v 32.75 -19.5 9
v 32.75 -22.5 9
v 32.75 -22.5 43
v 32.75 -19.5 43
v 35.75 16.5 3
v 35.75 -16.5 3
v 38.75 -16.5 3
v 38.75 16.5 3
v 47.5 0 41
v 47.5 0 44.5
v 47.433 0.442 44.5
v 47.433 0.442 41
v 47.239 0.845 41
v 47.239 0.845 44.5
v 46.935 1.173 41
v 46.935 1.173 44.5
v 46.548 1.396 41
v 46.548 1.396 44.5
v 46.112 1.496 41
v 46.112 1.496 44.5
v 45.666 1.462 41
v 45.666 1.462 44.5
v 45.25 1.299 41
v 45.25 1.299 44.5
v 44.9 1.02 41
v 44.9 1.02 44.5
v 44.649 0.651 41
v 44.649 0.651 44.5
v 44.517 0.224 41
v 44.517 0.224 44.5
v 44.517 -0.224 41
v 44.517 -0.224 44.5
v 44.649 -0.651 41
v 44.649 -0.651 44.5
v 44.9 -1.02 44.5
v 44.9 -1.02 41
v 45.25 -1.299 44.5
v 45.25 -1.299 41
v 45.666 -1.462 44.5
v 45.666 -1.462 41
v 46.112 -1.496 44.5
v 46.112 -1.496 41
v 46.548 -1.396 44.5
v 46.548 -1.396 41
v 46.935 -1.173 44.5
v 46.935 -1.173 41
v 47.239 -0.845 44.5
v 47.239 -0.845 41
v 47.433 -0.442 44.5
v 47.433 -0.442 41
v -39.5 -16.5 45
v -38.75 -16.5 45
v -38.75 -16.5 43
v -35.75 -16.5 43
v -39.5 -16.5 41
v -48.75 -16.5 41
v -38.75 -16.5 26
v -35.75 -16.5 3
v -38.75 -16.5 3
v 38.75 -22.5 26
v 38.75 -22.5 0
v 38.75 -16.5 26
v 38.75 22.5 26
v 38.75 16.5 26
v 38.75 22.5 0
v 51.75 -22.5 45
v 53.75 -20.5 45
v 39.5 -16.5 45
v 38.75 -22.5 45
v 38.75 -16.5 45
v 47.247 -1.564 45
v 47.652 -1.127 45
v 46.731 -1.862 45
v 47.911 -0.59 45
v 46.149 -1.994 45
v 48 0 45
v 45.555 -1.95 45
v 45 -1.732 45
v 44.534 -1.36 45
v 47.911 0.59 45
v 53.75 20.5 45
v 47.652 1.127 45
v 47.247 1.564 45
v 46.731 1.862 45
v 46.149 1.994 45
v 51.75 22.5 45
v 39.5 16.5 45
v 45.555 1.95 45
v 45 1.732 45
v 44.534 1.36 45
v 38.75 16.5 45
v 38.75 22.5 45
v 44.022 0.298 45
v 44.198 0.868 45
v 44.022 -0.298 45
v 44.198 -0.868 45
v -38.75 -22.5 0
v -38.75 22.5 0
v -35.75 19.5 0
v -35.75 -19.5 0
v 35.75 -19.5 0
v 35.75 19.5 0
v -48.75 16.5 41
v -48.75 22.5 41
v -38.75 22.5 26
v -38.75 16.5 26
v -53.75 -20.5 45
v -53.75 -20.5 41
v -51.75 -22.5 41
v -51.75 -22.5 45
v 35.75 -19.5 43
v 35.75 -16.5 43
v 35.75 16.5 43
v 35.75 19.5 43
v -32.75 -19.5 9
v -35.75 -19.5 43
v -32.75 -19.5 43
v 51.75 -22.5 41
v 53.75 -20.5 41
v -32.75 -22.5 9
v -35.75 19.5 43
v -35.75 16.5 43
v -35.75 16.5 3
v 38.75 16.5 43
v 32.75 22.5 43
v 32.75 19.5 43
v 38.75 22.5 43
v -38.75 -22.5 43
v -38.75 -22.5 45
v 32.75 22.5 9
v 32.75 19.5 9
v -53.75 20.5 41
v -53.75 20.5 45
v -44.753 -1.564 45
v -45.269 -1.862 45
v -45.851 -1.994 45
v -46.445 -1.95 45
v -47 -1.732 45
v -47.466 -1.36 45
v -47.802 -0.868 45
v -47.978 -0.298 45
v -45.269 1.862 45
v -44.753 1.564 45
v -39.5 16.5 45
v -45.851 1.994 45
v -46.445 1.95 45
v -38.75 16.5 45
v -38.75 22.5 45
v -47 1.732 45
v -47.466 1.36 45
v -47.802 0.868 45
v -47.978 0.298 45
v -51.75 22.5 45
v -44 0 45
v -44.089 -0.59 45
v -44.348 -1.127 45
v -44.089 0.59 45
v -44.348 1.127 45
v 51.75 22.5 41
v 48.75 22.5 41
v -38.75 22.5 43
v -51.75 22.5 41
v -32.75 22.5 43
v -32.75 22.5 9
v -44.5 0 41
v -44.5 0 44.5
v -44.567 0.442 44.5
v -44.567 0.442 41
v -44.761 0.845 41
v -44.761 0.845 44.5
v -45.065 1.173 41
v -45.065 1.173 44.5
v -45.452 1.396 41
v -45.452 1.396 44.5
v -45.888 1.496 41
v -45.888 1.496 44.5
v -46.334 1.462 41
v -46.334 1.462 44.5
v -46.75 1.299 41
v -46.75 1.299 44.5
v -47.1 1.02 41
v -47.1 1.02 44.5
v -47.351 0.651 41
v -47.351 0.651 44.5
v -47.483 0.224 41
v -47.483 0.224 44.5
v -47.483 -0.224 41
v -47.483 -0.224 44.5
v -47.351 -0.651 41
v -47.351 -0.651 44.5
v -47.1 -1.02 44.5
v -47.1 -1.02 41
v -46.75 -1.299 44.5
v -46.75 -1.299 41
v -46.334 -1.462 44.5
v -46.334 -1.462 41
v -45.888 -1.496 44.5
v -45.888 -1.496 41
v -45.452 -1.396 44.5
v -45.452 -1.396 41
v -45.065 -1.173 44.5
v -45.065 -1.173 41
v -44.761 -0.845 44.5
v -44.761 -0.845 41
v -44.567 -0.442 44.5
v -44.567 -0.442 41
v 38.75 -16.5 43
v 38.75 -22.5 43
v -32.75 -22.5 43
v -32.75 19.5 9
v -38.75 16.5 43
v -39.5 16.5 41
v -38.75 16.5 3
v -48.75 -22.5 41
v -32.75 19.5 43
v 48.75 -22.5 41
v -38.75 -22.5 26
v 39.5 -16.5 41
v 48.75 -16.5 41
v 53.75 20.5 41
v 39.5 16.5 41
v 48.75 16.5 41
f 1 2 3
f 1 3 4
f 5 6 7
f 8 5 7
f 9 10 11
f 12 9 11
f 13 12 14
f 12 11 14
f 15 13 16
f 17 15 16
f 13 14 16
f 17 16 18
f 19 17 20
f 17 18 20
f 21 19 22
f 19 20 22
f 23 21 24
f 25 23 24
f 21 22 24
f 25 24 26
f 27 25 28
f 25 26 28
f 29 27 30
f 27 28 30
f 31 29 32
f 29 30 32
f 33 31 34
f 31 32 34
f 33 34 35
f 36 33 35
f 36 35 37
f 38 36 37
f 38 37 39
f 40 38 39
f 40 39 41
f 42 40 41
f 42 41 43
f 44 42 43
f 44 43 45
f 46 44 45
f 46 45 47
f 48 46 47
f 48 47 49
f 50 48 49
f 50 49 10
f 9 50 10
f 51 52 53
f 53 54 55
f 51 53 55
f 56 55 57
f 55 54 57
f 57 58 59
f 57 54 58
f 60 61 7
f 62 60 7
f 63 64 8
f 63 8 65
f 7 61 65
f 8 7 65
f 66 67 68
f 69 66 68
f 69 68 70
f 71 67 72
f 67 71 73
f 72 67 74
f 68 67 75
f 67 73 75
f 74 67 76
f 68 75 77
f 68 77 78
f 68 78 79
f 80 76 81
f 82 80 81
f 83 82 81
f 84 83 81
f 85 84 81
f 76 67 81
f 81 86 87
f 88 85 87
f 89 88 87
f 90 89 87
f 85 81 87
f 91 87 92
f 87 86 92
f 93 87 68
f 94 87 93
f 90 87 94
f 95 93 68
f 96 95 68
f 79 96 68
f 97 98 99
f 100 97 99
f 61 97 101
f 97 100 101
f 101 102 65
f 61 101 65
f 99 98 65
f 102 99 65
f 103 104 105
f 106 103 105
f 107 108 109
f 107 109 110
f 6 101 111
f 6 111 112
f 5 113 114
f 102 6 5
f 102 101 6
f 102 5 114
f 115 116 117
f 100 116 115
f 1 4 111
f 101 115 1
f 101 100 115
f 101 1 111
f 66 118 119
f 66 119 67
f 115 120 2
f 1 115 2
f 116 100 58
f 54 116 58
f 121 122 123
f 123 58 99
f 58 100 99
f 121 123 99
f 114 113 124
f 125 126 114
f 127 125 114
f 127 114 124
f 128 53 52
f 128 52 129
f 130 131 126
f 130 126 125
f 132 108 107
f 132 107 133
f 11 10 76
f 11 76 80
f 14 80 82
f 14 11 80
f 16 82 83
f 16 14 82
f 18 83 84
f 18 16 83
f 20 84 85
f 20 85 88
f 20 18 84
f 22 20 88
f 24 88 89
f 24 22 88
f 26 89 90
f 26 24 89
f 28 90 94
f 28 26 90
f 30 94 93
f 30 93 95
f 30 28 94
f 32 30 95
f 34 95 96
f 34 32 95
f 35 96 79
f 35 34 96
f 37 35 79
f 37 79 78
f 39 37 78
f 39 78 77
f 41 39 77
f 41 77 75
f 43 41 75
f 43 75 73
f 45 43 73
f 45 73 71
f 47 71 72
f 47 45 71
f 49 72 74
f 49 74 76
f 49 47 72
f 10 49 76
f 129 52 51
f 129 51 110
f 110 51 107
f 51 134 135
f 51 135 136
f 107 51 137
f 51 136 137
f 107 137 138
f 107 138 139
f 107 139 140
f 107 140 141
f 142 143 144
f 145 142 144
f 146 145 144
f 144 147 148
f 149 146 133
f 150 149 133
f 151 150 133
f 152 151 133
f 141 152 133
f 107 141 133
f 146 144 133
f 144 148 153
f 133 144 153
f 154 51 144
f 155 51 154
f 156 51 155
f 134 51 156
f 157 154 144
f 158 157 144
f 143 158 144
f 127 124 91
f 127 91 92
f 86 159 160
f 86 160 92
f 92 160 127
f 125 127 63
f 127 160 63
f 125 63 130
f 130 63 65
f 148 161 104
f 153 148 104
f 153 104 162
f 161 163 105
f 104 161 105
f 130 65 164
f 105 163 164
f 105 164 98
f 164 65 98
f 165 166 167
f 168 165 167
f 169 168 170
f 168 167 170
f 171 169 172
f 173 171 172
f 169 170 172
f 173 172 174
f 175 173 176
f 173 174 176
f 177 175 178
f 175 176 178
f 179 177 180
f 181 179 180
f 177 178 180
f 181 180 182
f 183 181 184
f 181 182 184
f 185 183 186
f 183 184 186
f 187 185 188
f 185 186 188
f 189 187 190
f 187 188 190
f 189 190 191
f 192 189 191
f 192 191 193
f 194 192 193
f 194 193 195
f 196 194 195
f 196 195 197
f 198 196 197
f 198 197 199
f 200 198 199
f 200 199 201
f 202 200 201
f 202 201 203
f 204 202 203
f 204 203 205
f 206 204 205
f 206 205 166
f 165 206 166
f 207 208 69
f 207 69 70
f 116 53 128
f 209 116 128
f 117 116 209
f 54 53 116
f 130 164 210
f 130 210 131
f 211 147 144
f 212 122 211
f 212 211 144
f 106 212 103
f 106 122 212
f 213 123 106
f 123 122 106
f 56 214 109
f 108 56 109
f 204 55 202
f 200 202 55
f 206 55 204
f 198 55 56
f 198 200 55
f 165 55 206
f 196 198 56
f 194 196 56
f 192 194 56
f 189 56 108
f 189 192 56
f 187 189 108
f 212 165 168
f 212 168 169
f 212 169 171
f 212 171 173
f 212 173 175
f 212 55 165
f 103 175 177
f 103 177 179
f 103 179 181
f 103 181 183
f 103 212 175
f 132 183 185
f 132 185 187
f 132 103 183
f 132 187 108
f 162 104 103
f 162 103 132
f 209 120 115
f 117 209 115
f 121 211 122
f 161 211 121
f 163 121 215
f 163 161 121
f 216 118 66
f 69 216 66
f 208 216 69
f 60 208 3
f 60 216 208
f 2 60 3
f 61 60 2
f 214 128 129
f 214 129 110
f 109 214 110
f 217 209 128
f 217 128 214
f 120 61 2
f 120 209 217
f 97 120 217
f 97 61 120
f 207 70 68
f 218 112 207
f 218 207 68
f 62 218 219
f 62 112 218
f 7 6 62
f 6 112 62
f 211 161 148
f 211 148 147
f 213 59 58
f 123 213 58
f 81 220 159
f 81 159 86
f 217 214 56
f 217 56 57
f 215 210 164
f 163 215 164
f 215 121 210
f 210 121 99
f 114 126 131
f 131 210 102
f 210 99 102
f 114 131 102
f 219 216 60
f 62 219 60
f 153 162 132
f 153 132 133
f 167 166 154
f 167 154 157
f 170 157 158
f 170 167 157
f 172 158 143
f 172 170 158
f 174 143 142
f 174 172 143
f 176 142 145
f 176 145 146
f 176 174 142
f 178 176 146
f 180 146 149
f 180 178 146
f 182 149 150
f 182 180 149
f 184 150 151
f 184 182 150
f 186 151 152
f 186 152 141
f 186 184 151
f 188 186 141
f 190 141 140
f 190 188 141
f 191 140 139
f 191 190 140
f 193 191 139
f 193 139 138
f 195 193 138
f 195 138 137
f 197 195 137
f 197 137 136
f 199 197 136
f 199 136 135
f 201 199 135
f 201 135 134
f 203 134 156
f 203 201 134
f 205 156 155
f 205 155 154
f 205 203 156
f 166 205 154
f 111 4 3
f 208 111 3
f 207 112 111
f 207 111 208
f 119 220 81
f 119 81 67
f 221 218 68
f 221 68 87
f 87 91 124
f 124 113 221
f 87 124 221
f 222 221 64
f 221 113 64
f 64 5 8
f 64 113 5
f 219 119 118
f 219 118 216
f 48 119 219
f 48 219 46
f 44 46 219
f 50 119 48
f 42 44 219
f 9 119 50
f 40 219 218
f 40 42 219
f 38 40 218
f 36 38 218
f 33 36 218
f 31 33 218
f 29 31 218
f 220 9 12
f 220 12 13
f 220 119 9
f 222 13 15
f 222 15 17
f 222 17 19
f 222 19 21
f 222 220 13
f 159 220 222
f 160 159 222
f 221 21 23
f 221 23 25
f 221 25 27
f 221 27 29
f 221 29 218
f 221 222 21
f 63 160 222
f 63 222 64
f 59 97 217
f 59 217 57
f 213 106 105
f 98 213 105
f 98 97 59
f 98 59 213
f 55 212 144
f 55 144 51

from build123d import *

# Parameters (mm, degrees)
SKETCH_1_W             = 77.5
SKETCH_1_H             = 45
SKETCH_1_W_2           = 71.5
SKETCH_1_H_2           = 39
EXTRUDE_1_DEPTH        = 3
SKETCH_2_W             = 3
SKETCH_2_H             = 3
EXTRUDE_2_DEPTH        = 40
SKETCH_3_W             = 3
SKETCH_3_H             = 3
EXTRUDE_3_DEPTH        = 40
EXTRUDE_4_DEPTH        = 2
EXTRUDE_4_DEPTH_BACK   = 2
EXTRUDE_4_2_DEPTH      = 2
EXTRUDE_4_2_DEPTH_BACK = 2
SKETCH_5_W             = 65.5
SKETCH_5_H             = 6
EXTRUDE_5_DEPTH        = 3
SKETCH_6_W             = 65.5
SKETCH_6_H             = 6
EXTRUDE_6_DEPTH        = 3
SKETCH_7_R             = 1.5
CUT_EXTRUDE_1_DEPTH    = 5
CHAMFER_1_SIZE         = 0.5
CHAMFER_2_SIZE         = 0.5
CHAMFER_3_SIZE         = 2
CHAMFER_4_SIZE         = 2
EXTRUDE_7_DEPTH        = 6
MIRROR_2_COPY_1_DEPTH  = 6
MIRROR_2_COPY_2_DEPTH  = 6


with BuildPart() as part:
    # 草图1 → 凸台-拉伸1 (new body)
    with BuildSketch(Plane.XY):
        Rectangle(SKETCH_1_W, SKETCH_1_H)
        Rectangle(SKETCH_1_W_2, SKETCH_1_H_2, mode=Mode.SUBTRACT)
    extrude(amount=EXTRUDE_1_DEPTH)

    # 草图2 → 凸台-拉伸2 (add)
    with BuildSketch(Plane.XY.offset(3)):
        with Locations((37.25, 21)):
            Rectangle(SKETCH_2_W, SKETCH_2_H)
        with Locations((-37.25, 21)):
            Rectangle(SKETCH_2_W, SKETCH_2_H)
        with Locations((-37.25, -21)):
            Rectangle(SKETCH_2_W, SKETCH_2_H)
        with Locations((37.25, -21)):
            Rectangle(SKETCH_2_W, SKETCH_2_H)
    extrude(amount=EXTRUDE_2_DEPTH)

    # 草图3 → 凸台-拉伸3 (add)
    with BuildSketch(Plane.XY.offset(3)):
        with Locations((34.25, -21)):
            Rectangle(SKETCH_3_W, SKETCH_3_H)
        with Locations((37.25, 18)):
            Rectangle(SKETCH_3_W, SKETCH_3_H)
        with Locations((34.25, 21)):
            Rectangle(SKETCH_3_W, SKETCH_3_H)
        with Locations((37.25, -18)):
            Rectangle(SKETCH_3_W, SKETCH_3_H)
        with Locations((-34.25, 21)):
            Rectangle(SKETCH_3_W, SKETCH_3_H)
        with Locations((-37.25, 18)):
            Rectangle(SKETCH_3_W, SKETCH_3_H)
        with Locations((-37.25, -18)):
            Rectangle(SKETCH_3_W, SKETCH_3_H)
        with Locations((-34.25, -21)):
            Rectangle(SKETCH_3_W, SKETCH_3_H)
    extrude(amount=EXTRUDE_3_DEPTH)

    # 草图5 → 凸台-拉伸5 (add)
    with BuildSketch(Plane(origin=(0, 22.5, 0), x_dir=(1, 0, 0), z_dir=(0, 1, 0))):
        with Locations((0, -6)):
            Rectangle(SKETCH_5_W, SKETCH_5_H)
    extrude(amount=-EXTRUDE_5_DEPTH)


with BuildPart() as body_2:
    # 草图4 → 凸台-拉伸4 (new, two sides: drawn at the far end of the back side and taken through both)
    with BuildSketch(Plane.XY.offset(43).offset(-EXTRUDE_4_DEPTH_BACK)):
        Polygon((38.75, 22.5), (53.75, 22.5), (53.75, -22.5), (38.75, -22.5), (38.75, -16.5), (39.5, -16.5), (39.5, 16.5), (38.75, 16.5), align=None)
    extrude(amount=EXTRUDE_4_DEPTH + EXTRUDE_4_DEPTH_BACK)


with BuildPart() as body_3:
    # 草图4 → Extrude 4 2 (new, two sides: drawn at the far end of the back side and taken through both)
    with BuildSketch(Plane.XY.offset(43).offset(-EXTRUDE_4_2_DEPTH_BACK)):
        Polygon((-38.75, -16.5), (-38.75, -22.5), (-53.75, -22.5), (-53.75, 22.5), (-38.75, 22.5), (-38.75, 16.5), (-39.5, 16.5), (-39.5, -16.5), align=None)
    extrude(amount=EXTRUDE_4_2_DEPTH + EXTRUDE_4_2_DEPTH_BACK)


with BuildPart() as body_4:
    # 草图6 → 凸台-拉伸6 (new body)
    with BuildSketch(Plane.XZ.offset(22.5)):
        with Locations((0, 6)):
            Rectangle(SKETCH_6_W, SKETCH_6_H)
    extrude(amount=-EXTRUDE_6_DEPTH)


with BuildPart() as cut_extrude_1_tool:
    # 草图7 → 切除-拉伸1 (new body)
    with BuildSketch(Plane.XY.offset(45)):
        with Locations((-46, 0)):
            Circle(SKETCH_7_R)
        with Locations((46, 0)):
            Circle(SKETCH_7_R)
    extrude(amount=-CUT_EXTRUDE_1_DEPTH)


with BuildPart() as body_2_1:
    add(body_2.part)

    # 切除-拉伸1: cut by cut_extrude_1_tool
    add(cut_extrude_1_tool.part, mode=Mode.SUBTRACT)

    # 倒角2
    chamfer_2_edges = [body_2_1.edges().sort_by_distance(p)[0] for p in [
        (44.5, 0, 45),
    ]]
    chamfer(chamfer_2_edges, length=CHAMFER_2_SIZE)

    # 倒角3
    chamfer_3_edges = [body_2_1.edges().sort_by_distance(p)[0] for p in [
        (53.75, -22.5, 43),
        (53.75, 22.5, 43),
    ]]
    chamfer(chamfer_3_edges, length=CHAMFER_3_SIZE)


with BuildPart() as body_3_1:
    add(body_3.part)

    # 切除-拉伸1: cut by cut_extrude_1_tool
    add(cut_extrude_1_tool.part, mode=Mode.SUBTRACT)

    # 倒角1
    chamfer_1_edges = [body_3_1.edges().sort_by_distance(p)[0] for p in [
        (-47.5, 0, 45),
    ]]
    chamfer(chamfer_1_edges, length=CHAMFER_1_SIZE)


with BuildPart() as part_1:
    add(part.part)

    # Combine 1: union body 3
    add(body_3_1.part)


with BuildPart() as body_4_1:
    add(body_4.part)

    # Combine 2: union part
    add(part_1.part)


with BuildPart() as body_2_2:
    add(body_2_1.part)

    # Combine 3: union body 4
    add(body_4_1.part)

    # 倒角4
    chamfer_4_edges = [body_2_2.edges().sort_by_distance(p)[0] for p in [
        (-53.75, -22.5, 43),
        (-53.75, 22.5, 43),
    ]]
    chamfer(chamfer_4_edges, length=CHAMFER_4_SIZE)

    # 草图8 → 凸台-拉伸7 (add)
    with BuildSketch(Plane(origin=(0, 22.5, 0), x_dir=(1, 0, 0), z_dir=(0, 1, 0))):
        Polygon((48.75, -41), (38.75, -26), (38.75, -41), align=None)
    extrude_7 = extrude(amount=-EXTRUDE_7_DEPTH)

    # 镜向1: 凸台-拉伸7 across plane
    add(extrude_7.mirror(Plane(origin=(0, 0, 0), x_dir=(0, 0, 1), z_dir=(1, 0, 0))))

    # 镜向2 copy 1 sketch → 镜向2 copy 1 (add)
    with BuildSketch(Plane(origin=(0, -22.5, 0), x_dir=(-1, 0, 0), z_dir=(0, -1, 0))):
        Polygon((48.75, -41), (38.75, -26), (38.75, -41), align=None)
    extrude(amount=-MIRROR_2_COPY_1_DEPTH)

    # 镜向2 copy 2 sketch → 镜向2 copy 2 (add)
    with BuildSketch(Plane.XZ.offset(22.5)):
        Polygon((48.75, 41), (38.75, 26), (38.75, 41), align=None)
    extrude(amount=-MIRROR_2_COPY_2_DEPTH)


solid = body_2_2.part
